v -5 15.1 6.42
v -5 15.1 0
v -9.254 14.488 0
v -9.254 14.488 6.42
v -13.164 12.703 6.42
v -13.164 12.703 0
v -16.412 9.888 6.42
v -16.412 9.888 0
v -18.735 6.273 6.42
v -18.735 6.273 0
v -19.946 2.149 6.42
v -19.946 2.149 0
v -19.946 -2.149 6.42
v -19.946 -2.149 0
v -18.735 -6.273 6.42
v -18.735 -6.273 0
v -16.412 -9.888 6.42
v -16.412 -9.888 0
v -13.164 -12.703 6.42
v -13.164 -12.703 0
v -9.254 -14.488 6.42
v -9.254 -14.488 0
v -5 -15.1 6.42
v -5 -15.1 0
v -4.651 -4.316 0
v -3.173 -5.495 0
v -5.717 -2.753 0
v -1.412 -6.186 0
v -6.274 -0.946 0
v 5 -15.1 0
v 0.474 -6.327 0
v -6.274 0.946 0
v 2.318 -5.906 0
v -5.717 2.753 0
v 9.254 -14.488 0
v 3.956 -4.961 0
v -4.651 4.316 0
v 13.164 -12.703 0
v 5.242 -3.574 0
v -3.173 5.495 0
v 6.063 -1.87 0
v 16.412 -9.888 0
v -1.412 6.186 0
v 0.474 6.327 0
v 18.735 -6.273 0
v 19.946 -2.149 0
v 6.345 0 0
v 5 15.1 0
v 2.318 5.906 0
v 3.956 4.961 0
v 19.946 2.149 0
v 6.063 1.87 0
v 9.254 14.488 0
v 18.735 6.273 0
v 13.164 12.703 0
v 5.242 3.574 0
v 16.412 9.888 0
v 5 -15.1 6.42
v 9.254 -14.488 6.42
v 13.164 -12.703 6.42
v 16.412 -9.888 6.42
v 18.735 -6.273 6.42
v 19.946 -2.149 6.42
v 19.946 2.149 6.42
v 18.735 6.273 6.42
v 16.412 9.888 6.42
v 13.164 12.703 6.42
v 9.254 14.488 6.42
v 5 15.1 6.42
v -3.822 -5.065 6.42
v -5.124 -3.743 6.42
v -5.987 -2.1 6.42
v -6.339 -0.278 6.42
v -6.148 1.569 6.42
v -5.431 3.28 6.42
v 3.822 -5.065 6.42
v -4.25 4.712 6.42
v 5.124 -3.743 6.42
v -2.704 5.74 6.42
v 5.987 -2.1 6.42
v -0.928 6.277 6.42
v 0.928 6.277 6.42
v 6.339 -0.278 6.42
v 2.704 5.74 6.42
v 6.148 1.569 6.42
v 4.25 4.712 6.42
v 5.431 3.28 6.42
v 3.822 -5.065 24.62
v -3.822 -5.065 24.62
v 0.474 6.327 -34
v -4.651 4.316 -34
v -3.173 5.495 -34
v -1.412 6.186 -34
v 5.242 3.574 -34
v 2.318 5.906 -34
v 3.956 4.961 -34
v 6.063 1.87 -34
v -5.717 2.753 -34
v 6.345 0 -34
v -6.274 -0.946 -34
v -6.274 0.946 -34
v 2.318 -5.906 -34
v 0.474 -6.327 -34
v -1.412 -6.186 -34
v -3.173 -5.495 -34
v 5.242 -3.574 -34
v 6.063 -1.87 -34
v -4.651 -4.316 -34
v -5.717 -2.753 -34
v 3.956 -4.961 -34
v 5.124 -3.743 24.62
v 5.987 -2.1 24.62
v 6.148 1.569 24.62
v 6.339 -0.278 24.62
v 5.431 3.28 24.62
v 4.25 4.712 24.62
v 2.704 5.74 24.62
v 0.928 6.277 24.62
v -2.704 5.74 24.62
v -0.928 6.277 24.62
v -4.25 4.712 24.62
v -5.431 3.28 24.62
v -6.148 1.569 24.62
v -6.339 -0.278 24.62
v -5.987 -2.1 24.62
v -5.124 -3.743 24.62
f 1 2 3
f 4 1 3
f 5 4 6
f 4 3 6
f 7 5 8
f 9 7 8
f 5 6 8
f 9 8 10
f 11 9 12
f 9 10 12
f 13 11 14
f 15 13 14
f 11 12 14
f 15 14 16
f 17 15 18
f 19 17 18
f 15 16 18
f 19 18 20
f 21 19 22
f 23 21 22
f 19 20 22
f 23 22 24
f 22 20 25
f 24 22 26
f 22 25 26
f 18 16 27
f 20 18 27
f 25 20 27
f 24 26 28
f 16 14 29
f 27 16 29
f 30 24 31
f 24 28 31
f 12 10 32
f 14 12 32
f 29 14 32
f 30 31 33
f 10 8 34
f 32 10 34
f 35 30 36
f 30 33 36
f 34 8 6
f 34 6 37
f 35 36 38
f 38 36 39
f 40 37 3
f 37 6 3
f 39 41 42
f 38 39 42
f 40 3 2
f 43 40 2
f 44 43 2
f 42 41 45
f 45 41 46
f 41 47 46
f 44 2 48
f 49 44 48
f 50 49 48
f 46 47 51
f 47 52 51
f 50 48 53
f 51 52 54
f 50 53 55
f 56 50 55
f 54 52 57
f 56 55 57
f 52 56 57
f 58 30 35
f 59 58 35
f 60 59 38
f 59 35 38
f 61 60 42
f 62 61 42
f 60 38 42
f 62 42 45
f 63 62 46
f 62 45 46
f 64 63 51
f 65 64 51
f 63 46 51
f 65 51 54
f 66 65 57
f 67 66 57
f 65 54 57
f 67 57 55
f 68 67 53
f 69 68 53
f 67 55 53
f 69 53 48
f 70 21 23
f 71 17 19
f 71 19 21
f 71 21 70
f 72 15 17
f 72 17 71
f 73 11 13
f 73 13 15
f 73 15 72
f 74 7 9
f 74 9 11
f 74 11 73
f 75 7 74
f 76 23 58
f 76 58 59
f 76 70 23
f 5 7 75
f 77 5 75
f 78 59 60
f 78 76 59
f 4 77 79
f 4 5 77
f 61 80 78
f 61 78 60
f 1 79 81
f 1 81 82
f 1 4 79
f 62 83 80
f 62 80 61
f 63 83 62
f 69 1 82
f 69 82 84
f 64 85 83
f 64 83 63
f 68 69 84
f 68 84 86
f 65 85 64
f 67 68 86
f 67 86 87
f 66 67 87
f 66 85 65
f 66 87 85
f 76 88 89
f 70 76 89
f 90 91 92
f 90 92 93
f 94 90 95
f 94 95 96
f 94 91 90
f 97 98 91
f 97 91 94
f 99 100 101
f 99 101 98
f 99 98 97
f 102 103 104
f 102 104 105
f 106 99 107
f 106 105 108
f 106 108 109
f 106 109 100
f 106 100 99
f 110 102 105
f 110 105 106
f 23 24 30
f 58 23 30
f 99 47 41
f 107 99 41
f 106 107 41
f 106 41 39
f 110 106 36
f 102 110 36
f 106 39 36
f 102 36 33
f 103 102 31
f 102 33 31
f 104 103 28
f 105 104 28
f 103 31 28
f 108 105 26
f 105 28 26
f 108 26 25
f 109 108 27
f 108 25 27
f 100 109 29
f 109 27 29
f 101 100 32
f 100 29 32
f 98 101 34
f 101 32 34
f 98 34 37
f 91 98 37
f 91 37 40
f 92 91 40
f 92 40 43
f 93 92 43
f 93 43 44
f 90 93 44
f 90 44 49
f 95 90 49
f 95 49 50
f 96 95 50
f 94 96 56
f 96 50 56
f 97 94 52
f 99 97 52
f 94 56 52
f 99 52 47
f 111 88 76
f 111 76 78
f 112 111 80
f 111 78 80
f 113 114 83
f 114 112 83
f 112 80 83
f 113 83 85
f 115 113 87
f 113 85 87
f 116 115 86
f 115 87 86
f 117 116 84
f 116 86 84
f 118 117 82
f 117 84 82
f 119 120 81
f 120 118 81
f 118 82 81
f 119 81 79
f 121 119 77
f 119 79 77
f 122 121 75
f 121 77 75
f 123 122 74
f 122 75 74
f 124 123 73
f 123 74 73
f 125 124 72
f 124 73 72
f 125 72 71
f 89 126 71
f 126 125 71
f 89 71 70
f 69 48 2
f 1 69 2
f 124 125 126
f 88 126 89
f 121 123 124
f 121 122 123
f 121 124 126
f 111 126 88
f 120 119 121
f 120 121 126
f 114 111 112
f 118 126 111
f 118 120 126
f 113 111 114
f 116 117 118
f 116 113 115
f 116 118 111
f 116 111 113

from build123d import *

# Parameters (mm, degrees)
F1_DEPTH = 6.42
F2_R     = 6.345
F3_DEPTH = 34
F4_R     = 6.345
F5_DEPTH = 18.2
F7_DEPTH = 18.2


with BuildPart() as f1:
    # F0 (on Top) → F1 (new body)
    with BuildSketch(Plane.XY):
        with BuildLine():
            Line((5, 15.1), (-5, 15.1))
            ThreePointArc((-5, 15.1), (-20.1, 0), (-5, -15.1))
            Line((-5, -15.1), (5, -15.1))
            ThreePointArc((5, -15.1), (20.1, 0), (5, 15.1))
        make_face()
    extrude(amount=F1_DEPTH)

    # F2 (on face) → F3 (join)
    with BuildSketch(Plane(origin=(0, 0, 0), x_dir=(1, 0, 0), z_dir=(0, 0, -1))):
        Circle(F2_R)
    extrude(amount=F3_DEPTH)

    # F4 (on face) → F5 (join)
    with BuildSketch(Plane.XY.offset(6.42)):
        Circle(F4_R)
    extrude(amount=F5_DEPTH)

    # F6 (on face) → F7 (cut)
    with BuildSketch(Plane.XY.offset(24.62)):
        with BuildLine():
            ThreePointArc((-3.821623, -5.065), (-2.015143, -6.016496), (0, -6.345))
            Line((0, -6.345), (0, -5.065))
            Line((0, -5.065), (-3.821623, -5.065))
        make_face()
        with BuildLine():
            Line((0, -5.065), (0, -6.345))
            ThreePointArc((0, -6.345), (2.015143, -6.016496), (3.821623, -5.065))
            Line((3.821623, -5.065), (0, -5.065))
        make_face()
    extrude(amount=-F7_DEPTH, mode=Mode.SUBTRACT)


solid = f1.part
